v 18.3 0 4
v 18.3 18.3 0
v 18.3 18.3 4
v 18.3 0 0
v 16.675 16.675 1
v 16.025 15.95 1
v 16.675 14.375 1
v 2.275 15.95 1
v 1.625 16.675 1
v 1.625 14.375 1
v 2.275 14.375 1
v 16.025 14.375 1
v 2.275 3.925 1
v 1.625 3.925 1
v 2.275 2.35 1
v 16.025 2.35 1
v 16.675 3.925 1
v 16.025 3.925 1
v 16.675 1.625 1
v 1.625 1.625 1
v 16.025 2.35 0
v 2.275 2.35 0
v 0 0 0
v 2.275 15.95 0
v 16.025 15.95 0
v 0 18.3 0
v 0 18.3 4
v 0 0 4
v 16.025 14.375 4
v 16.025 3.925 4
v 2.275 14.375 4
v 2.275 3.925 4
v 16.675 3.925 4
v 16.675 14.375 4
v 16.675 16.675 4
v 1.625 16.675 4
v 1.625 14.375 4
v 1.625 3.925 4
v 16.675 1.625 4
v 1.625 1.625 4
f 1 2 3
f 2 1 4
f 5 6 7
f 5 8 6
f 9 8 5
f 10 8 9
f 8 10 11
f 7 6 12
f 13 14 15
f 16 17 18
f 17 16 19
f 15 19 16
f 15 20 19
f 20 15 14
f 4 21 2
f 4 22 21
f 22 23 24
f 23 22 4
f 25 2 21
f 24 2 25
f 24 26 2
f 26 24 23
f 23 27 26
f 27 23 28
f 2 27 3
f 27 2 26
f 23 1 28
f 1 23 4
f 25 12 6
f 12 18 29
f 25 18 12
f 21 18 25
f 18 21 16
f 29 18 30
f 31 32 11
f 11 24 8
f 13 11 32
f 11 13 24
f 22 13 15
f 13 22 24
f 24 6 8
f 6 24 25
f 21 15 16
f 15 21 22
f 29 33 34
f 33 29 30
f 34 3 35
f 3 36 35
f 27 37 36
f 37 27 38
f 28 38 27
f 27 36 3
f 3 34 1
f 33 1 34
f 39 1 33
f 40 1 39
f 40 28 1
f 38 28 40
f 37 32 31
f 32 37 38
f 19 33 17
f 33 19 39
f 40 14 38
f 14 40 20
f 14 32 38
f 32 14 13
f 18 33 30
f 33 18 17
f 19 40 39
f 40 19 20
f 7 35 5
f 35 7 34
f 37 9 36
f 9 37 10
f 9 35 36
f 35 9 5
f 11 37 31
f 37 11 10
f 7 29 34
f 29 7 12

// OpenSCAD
// outer square dimensions
os=18.3;

//  TOP VIEW OF KEY BUTTON
// ==================================================
//
//  *-----------------*  --.
//   \-----[   ]-----/    |      <--- top right corner ("dips in")
//   |---------------|    |
//   |---------------|    |
//   |---------------|     > 13.60 mm
//   |---------------|    |
//   |---------------|    |
//   /---------------\    |
//  *-----------------*  --.
//
//  |                 |
//  .--------v--------.
//        13.75 mm

under_lip_width=13.75;
under_lip_height=13.60;
under_lip_depth=1; // the clips "snap" onto this.


// ==================================================
//
//
//  . . . -----------------._      ---\
//                           \         |
//                           |          >  2.30 mm
//                          _|         |
//                         |     -----/
//                         |
//                         |
//                         |
//                         |   <--- what we want to "fill in" on the upper layer
//
//  \_. . ._______________/
//             v
//          13.75 mm

lip_height=15.05;
lip_width=15.05;
wall_height=3;
dip_height=2.3;

difference() {
    cube([ os, os, under_lip_depth ]);
    translate([ (os - under_lip_width) / 2, (os - under_lip_height) / 2, 0 ]) {
        cube([ under_lip_width, under_lip_height, under_lip_depth ]);
    }
}



translate([ 0, 0, under_lip_depth ]) difference() {
    cube([ os, os, wall_height ]);
    
    translate([ (os - under_lip_width) / 2, (os - under_lip_height) / 2, 0 ]) {
        cube([ under_lip_width, under_lip_height, wall_height ]);
    };
    
    translate([ (os - lip_width) / 2, (os - lip_height) / 2, 0 ]) {
        cube([ lip_width, dip_height, wall_height ]);
    };
    
    translate([0, lip_height - dip_height, 0]) 
    translate([ (os - lip_width) / 2, (os - lip_height) / 2, 0 ]) {
        cube([ lip_width, dip_height, wall_height ]);
    };
    
}
